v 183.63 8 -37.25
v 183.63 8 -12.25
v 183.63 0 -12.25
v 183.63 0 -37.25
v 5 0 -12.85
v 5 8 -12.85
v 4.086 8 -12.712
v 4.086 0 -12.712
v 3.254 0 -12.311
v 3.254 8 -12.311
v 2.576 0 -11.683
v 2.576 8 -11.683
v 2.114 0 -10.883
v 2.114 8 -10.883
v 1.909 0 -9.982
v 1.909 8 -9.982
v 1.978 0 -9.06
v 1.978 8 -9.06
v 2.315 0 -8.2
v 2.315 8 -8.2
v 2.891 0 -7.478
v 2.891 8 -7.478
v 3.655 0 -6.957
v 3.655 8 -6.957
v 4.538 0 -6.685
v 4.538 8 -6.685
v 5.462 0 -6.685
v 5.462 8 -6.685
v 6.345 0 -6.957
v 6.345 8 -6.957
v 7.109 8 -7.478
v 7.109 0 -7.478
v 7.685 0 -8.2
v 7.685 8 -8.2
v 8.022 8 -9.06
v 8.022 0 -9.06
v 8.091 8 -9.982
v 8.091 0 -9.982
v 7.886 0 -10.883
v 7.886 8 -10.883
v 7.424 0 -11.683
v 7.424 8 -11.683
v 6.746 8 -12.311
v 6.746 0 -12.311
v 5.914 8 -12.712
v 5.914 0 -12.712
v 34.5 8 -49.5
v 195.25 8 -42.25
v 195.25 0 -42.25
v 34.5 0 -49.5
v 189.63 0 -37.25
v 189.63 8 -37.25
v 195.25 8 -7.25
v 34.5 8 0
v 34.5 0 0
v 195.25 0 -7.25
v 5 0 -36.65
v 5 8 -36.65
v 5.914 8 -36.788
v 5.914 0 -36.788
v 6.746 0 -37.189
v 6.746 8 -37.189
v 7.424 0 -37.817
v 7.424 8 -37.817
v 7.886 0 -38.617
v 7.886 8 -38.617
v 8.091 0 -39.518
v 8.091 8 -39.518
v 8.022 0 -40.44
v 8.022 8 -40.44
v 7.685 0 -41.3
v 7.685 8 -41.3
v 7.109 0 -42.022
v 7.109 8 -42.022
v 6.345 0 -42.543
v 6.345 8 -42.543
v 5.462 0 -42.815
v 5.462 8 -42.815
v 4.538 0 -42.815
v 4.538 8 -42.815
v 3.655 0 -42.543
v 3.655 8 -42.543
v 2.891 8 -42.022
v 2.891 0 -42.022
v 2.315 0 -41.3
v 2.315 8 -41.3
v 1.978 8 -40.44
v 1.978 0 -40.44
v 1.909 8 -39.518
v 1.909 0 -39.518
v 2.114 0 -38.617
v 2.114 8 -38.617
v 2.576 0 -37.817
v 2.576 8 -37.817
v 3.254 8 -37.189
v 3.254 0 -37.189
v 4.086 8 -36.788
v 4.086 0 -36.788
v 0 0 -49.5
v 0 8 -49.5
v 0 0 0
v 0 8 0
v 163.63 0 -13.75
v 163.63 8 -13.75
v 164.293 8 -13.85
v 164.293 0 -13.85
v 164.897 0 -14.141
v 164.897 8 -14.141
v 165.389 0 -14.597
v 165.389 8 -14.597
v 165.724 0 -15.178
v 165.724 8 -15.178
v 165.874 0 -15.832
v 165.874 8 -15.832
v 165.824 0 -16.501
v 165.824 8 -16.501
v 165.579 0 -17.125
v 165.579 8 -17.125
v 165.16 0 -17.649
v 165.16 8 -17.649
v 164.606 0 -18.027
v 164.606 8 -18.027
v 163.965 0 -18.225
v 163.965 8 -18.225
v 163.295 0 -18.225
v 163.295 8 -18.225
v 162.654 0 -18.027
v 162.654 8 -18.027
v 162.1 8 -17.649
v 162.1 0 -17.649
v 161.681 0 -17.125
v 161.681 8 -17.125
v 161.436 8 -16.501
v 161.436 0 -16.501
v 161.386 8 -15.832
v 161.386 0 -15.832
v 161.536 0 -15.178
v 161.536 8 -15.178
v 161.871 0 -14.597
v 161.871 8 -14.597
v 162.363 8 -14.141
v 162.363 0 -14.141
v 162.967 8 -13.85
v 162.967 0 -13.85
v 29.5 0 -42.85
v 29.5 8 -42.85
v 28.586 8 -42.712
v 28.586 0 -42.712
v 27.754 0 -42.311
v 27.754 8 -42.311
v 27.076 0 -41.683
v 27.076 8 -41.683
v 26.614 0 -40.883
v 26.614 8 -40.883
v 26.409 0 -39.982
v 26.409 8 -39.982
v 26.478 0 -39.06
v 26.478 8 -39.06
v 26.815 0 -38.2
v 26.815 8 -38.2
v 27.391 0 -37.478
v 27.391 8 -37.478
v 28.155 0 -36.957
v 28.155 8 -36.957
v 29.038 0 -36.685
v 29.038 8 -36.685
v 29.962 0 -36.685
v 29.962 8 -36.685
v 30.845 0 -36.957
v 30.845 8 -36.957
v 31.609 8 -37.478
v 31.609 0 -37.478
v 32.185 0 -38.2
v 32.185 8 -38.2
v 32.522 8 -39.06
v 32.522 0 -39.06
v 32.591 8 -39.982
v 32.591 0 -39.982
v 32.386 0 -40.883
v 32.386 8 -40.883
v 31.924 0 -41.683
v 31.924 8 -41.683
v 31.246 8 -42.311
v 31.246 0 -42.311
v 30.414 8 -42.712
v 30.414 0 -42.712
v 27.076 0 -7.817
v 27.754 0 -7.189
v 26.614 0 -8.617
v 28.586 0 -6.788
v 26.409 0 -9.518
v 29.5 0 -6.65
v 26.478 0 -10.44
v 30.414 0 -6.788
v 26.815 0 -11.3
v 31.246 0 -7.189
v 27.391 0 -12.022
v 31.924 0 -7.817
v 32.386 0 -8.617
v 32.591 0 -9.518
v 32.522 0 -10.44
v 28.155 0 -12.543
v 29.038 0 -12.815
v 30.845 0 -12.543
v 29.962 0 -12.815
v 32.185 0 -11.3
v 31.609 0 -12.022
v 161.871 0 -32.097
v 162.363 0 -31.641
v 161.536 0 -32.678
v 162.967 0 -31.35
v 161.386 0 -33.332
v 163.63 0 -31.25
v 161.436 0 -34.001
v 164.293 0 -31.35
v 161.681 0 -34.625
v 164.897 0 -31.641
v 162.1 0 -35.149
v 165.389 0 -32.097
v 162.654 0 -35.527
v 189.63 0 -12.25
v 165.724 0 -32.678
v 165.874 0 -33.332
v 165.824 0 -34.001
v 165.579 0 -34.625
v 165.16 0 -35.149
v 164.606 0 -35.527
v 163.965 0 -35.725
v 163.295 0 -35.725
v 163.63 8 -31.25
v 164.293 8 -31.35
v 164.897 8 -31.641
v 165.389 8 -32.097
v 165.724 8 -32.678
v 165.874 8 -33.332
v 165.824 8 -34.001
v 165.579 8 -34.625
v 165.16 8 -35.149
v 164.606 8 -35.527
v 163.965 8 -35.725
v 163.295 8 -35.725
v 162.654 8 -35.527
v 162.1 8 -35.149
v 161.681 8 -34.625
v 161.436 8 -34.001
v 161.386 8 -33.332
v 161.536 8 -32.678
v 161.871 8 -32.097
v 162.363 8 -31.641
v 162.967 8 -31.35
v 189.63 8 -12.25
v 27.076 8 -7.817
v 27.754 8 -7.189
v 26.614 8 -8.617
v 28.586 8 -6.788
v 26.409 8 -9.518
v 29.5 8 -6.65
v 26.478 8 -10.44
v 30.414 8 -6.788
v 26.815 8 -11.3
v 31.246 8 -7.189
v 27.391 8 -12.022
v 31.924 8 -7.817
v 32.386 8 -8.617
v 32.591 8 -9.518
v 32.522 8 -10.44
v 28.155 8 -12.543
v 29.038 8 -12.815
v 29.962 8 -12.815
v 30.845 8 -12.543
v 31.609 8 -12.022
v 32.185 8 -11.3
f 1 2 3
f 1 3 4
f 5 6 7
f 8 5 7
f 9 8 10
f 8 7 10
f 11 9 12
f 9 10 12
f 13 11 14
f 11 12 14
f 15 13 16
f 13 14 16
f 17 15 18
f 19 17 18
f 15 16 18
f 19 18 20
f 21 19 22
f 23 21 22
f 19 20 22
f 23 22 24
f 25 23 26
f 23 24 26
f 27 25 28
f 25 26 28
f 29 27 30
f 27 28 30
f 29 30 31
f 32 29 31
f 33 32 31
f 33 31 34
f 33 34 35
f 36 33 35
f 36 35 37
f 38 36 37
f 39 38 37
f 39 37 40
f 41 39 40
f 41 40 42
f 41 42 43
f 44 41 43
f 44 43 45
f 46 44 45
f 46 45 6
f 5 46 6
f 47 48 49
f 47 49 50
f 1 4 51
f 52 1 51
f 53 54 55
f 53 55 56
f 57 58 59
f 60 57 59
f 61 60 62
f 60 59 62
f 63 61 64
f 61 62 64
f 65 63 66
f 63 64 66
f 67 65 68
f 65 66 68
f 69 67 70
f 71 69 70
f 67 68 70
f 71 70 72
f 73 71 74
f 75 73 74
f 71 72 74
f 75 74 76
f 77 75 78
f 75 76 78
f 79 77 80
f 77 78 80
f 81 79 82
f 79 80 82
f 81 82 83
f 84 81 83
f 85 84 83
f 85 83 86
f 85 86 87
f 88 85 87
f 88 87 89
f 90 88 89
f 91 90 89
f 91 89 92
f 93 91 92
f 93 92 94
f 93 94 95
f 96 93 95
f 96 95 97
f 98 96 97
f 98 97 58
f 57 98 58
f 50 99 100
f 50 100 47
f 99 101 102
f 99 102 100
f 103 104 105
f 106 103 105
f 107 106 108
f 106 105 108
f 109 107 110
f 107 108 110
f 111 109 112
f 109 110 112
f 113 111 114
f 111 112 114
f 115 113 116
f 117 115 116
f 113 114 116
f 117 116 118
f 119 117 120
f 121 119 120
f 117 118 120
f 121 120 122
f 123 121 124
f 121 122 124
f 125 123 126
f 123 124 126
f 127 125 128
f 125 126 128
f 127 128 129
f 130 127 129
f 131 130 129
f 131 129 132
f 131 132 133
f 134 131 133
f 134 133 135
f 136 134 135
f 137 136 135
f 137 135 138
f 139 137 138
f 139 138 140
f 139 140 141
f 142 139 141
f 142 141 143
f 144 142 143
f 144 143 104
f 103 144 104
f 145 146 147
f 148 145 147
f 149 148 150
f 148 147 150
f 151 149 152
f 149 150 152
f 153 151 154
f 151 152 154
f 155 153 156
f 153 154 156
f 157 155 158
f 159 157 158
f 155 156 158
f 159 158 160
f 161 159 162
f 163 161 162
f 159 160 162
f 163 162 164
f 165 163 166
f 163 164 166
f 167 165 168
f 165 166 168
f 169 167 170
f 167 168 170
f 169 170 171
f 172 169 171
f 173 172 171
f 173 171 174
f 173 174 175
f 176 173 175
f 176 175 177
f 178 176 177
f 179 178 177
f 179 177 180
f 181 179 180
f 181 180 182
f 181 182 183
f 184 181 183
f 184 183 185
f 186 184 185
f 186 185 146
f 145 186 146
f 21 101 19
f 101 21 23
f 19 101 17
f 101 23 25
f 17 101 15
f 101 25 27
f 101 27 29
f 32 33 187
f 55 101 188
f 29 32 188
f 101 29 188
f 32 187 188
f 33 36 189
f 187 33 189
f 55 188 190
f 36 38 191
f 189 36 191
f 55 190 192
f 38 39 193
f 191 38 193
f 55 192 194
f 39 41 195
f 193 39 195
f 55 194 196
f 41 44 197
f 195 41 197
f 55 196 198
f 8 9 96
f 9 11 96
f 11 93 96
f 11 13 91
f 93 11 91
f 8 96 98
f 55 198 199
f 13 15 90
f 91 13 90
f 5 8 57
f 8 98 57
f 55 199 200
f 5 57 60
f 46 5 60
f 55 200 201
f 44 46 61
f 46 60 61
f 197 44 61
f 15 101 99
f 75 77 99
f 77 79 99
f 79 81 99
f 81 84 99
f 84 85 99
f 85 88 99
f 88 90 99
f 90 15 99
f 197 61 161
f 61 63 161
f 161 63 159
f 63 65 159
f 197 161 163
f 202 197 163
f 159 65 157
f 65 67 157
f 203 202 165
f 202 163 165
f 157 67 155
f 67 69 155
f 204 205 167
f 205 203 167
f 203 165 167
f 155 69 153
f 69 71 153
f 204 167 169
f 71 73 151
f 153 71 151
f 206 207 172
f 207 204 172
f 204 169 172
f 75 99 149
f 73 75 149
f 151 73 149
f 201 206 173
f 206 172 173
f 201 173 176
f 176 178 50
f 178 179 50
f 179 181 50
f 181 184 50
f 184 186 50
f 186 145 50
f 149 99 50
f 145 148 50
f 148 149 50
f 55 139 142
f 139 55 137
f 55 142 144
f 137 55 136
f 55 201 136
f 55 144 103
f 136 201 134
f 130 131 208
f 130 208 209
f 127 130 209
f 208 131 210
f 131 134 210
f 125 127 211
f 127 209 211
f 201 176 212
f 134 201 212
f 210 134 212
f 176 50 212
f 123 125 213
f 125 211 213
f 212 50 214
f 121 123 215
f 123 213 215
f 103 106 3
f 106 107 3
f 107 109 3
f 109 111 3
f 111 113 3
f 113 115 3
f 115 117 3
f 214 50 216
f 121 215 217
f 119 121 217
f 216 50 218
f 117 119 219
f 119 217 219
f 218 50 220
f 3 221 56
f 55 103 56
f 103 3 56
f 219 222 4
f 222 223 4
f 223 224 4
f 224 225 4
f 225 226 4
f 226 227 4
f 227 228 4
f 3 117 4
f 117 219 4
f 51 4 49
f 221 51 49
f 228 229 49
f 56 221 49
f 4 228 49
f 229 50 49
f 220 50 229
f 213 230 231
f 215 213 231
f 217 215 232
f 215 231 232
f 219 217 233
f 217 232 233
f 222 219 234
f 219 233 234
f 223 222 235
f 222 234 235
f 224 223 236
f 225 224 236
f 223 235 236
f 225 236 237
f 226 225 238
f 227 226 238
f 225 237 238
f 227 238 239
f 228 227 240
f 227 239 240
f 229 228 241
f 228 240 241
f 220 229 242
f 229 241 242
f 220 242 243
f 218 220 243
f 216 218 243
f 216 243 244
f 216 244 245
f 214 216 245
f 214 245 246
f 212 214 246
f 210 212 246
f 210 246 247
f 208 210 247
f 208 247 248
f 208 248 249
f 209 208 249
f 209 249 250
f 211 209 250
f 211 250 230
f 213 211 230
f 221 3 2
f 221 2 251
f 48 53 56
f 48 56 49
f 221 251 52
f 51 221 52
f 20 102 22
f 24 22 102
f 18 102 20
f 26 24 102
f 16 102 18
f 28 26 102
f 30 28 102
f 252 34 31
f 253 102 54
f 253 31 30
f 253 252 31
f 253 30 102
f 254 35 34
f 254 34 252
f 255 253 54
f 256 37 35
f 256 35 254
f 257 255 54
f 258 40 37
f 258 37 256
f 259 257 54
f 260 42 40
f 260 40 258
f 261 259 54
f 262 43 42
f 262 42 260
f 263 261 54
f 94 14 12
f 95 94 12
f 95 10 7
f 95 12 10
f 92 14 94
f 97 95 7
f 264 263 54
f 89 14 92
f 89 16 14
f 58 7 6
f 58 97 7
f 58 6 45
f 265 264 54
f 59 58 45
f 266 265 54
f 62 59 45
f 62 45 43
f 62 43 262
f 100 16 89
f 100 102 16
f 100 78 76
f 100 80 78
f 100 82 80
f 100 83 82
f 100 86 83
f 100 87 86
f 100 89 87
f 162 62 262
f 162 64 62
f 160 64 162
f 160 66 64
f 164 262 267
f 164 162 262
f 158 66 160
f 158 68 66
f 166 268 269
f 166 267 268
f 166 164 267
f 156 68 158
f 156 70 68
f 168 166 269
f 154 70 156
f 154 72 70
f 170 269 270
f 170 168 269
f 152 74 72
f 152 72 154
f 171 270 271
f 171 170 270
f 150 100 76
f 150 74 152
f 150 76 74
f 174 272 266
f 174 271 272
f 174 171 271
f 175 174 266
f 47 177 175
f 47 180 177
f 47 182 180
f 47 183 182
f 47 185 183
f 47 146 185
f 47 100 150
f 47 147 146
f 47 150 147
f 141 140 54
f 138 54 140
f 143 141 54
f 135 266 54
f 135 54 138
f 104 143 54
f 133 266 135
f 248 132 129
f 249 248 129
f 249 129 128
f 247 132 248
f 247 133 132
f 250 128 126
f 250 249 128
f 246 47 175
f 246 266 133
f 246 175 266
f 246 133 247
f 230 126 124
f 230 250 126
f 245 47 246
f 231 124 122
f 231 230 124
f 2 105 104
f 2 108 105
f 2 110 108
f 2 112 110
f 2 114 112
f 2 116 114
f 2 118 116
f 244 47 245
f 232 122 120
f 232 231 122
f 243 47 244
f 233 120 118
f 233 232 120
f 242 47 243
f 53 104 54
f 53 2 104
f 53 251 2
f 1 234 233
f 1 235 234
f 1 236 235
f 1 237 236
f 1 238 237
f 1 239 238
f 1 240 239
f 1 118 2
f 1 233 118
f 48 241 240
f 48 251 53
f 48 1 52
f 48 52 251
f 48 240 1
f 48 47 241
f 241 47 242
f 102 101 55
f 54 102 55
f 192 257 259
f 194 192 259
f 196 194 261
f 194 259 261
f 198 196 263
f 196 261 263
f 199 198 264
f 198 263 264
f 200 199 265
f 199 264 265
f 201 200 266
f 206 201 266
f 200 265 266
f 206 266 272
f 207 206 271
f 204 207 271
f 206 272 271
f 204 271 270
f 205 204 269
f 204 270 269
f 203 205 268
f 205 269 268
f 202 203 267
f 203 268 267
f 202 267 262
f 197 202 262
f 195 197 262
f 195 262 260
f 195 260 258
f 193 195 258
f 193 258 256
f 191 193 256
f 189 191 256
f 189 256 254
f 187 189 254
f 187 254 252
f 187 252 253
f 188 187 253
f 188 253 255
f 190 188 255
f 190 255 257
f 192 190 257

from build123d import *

# Parameters (mm, degrees)
SKETCH1_W           = 34.5
SKETCH1_H           = 49.5
BOSS_EXTRUDE1_DEPTH = 8
SKETCH2_R           = 3.1
CUT_EXTRUDE1_DEPTH  = 61.864603835
SKETCH3_W           = 6
SKETCH3_H           = 25
BOSS_EXTRUDE2_DEPTH = 8
FILLET1_R           = 10
FILLET2_R           = 5
BOSS_EXTRUDE3_DEPTH = 8
SKETCH8_R           = 2.25
CUT_EXTRUDE2_DEPTH  = 202.585744784


with BuildPart() as part:
    # Sketch1 → Boss-Extrude1 (new body)
    with BuildSketch(Plane(origin=(0, 0, 0), x_dir=(1, 0, 0), z_dir=(0, 1, 0))):
        with Locations((17.25, 24.75)):
            Rectangle(SKETCH1_W, SKETCH1_H)
    extrude(amount=BOSS_EXTRUDE1_DEPTH)

    # Sketch2 → Cut-Extrude1 (cut, through all)
    with BuildSketch(Plane(origin=(0, 8, 0), x_dir=(1, 0, 0), z_dir=(0, 1, 0))):
        with Locations(Location((5, 39.75, 0), (0, 0, 270))):
            Circle(SKETCH2_R)
        with Locations(Location((5, 9.75, 0), (0, 0, 90))):
            Circle(SKETCH2_R)
        with Locations(Location((29.5, 9.75, 0), (0, 0, 270))):
            Circle(SKETCH2_R)
        with Locations(Location((29.5, 39.75, 0), (0, 0, 90))):
            Circle(SKETCH2_R)
    extrude(amount=-CUT_EXTRUDE1_DEPTH, mode=Mode.SUBTRACT)

    # Sketch3 → Boss-Extrude2 (add, through all)
    with BuildSketch(Plane(origin=(0, 8, 0), x_dir=(1, 0, 0), z_dir=(0, 1, 0))):
        Polygon((195.25, 42.25), (34.5, 49.5), (34.5, 41.491867701), (89.599952536, 39.006799857), (89.599952536, 10.493200143), (34.5, 8.008132299), (34.5, 0), (195.25, 7.25), align=None)
        Polygon((176.564901879, 14.415414033), (94.599952536, 10.718705586), (94.599952536, 38.781294414), (176.564901879, 35.084585967), align=None, mode=Mode.SUBTRACT)
        with Locations((186.63, 24.75)):
            Rectangle(SKETCH3_W, SKETCH3_H, mode=Mode.SUBTRACT)
    extrude(amount=-BOSS_EXTRUDE2_DEPTH)

    # Fillet1
    fillet1_edges = [part.edges().sort_by_distance(p)[0] for p in [
        (34.5, 4, -8.008132299),
        (89.599952536, 4, -10.493200143),
        (89.599952536, 4, -39.006799857),
        (34.5, 4, -41.491867701),
        (94.599952536, 4, -38.781294414),
        (94.599952536, 4, -10.718705586),
    ]]
    fillet(fillet1_edges, radius=FILLET1_R)

    # Fillet2
    fillet2_edges = [part.edges().sort_by_distance(p)[0] for p in [
        (176.564901879, 4, -35.084585967),
        (176.564901879, 4, -14.415414033),
    ]]
    fillet(fillet2_edges, radius=FILLET2_R)

    # Sketch7 → Boss-Extrude3 (add, through all)
    with BuildSketch(Plane(origin=(0, 8, 0), x_dir=(1, 0, 0), z_dir=(0, 1, 0))):
        with BuildLine():
            Line((105.050505418, 11.190036898), (171.79017832, 14.200068802))
            ThreePointArc((171.79017832, 14.200068802), (175.179205561, 15.740022551), (176.564901879, 19.194991277))
            Line((176.564901879, 19.194991277), (176.564901879, 30.305008723))
            ThreePointArc((176.564901879, 30.305008723), (175.179205561, 33.759977449), (171.79017832, 35.299931198))
            Line((171.79017832, 35.299931198), (105.050505418, 38.309963102))
            ThreePointArc((105.050505418, 38.309963102), (97.690015084, 35.548725516), (94.599952536, 28.320118153))
            Line((94.599952536, 28.320118153), (94.599952536, 21.179881847))
            ThreePointArc((94.599952536, 21.179881847), (97.690015084, 13.951274484), (105.050505418, 11.190036898))
        make_face()
        with BuildLine():
            Line((89.599952536, 20.052354631), (89.599952536, 29.447645369))
            ThreePointArc((89.599952536, 29.447645369), (86.828559899, 36.357582821), (80.050505418, 39.437490318))
            Line((80.050505418, 39.437490318), (44.950552883, 41.020536389))
            ThreePointArc((44.950552883, 41.020536389), (37.590062548, 38.259298803), (34.5, 31.03069144))
            Line((34.5, 31.03069144), (34.5, 18.46930856))
            ThreePointArc((34.5, 18.46930856), (37.590062548, 11.240701197), (44.950552883, 8.479463611))
            Line((44.950552883, 8.479463611), (80.050505418, 10.062509682))
            ThreePointArc((80.050505418, 10.062509682), (86.828559899, 13.142417179), (89.599952536, 20.052354631))
        make_face()
    extrude(amount=-BOSS_EXTRUDE3_DEPTH)

    # Sketch8 → Cut-Extrude2 (cut, through all)
    with BuildSketch(Plane(origin=(0, 8, 0), x_dir=(1, 0, 0), z_dir=(0, 1, 0))):
        with Locations(Location((163.63, 33.5, 0), (0, 0, 270))):
            Circle(SKETCH8_R)
        with Locations(Location((163.63, 16, 0), (0, 0, 270))):
            Circle(SKETCH8_R)
    extrude(amount=-CUT_EXTRUDE2_DEPTH, mode=Mode.SUBTRACT)


solid = part.part
